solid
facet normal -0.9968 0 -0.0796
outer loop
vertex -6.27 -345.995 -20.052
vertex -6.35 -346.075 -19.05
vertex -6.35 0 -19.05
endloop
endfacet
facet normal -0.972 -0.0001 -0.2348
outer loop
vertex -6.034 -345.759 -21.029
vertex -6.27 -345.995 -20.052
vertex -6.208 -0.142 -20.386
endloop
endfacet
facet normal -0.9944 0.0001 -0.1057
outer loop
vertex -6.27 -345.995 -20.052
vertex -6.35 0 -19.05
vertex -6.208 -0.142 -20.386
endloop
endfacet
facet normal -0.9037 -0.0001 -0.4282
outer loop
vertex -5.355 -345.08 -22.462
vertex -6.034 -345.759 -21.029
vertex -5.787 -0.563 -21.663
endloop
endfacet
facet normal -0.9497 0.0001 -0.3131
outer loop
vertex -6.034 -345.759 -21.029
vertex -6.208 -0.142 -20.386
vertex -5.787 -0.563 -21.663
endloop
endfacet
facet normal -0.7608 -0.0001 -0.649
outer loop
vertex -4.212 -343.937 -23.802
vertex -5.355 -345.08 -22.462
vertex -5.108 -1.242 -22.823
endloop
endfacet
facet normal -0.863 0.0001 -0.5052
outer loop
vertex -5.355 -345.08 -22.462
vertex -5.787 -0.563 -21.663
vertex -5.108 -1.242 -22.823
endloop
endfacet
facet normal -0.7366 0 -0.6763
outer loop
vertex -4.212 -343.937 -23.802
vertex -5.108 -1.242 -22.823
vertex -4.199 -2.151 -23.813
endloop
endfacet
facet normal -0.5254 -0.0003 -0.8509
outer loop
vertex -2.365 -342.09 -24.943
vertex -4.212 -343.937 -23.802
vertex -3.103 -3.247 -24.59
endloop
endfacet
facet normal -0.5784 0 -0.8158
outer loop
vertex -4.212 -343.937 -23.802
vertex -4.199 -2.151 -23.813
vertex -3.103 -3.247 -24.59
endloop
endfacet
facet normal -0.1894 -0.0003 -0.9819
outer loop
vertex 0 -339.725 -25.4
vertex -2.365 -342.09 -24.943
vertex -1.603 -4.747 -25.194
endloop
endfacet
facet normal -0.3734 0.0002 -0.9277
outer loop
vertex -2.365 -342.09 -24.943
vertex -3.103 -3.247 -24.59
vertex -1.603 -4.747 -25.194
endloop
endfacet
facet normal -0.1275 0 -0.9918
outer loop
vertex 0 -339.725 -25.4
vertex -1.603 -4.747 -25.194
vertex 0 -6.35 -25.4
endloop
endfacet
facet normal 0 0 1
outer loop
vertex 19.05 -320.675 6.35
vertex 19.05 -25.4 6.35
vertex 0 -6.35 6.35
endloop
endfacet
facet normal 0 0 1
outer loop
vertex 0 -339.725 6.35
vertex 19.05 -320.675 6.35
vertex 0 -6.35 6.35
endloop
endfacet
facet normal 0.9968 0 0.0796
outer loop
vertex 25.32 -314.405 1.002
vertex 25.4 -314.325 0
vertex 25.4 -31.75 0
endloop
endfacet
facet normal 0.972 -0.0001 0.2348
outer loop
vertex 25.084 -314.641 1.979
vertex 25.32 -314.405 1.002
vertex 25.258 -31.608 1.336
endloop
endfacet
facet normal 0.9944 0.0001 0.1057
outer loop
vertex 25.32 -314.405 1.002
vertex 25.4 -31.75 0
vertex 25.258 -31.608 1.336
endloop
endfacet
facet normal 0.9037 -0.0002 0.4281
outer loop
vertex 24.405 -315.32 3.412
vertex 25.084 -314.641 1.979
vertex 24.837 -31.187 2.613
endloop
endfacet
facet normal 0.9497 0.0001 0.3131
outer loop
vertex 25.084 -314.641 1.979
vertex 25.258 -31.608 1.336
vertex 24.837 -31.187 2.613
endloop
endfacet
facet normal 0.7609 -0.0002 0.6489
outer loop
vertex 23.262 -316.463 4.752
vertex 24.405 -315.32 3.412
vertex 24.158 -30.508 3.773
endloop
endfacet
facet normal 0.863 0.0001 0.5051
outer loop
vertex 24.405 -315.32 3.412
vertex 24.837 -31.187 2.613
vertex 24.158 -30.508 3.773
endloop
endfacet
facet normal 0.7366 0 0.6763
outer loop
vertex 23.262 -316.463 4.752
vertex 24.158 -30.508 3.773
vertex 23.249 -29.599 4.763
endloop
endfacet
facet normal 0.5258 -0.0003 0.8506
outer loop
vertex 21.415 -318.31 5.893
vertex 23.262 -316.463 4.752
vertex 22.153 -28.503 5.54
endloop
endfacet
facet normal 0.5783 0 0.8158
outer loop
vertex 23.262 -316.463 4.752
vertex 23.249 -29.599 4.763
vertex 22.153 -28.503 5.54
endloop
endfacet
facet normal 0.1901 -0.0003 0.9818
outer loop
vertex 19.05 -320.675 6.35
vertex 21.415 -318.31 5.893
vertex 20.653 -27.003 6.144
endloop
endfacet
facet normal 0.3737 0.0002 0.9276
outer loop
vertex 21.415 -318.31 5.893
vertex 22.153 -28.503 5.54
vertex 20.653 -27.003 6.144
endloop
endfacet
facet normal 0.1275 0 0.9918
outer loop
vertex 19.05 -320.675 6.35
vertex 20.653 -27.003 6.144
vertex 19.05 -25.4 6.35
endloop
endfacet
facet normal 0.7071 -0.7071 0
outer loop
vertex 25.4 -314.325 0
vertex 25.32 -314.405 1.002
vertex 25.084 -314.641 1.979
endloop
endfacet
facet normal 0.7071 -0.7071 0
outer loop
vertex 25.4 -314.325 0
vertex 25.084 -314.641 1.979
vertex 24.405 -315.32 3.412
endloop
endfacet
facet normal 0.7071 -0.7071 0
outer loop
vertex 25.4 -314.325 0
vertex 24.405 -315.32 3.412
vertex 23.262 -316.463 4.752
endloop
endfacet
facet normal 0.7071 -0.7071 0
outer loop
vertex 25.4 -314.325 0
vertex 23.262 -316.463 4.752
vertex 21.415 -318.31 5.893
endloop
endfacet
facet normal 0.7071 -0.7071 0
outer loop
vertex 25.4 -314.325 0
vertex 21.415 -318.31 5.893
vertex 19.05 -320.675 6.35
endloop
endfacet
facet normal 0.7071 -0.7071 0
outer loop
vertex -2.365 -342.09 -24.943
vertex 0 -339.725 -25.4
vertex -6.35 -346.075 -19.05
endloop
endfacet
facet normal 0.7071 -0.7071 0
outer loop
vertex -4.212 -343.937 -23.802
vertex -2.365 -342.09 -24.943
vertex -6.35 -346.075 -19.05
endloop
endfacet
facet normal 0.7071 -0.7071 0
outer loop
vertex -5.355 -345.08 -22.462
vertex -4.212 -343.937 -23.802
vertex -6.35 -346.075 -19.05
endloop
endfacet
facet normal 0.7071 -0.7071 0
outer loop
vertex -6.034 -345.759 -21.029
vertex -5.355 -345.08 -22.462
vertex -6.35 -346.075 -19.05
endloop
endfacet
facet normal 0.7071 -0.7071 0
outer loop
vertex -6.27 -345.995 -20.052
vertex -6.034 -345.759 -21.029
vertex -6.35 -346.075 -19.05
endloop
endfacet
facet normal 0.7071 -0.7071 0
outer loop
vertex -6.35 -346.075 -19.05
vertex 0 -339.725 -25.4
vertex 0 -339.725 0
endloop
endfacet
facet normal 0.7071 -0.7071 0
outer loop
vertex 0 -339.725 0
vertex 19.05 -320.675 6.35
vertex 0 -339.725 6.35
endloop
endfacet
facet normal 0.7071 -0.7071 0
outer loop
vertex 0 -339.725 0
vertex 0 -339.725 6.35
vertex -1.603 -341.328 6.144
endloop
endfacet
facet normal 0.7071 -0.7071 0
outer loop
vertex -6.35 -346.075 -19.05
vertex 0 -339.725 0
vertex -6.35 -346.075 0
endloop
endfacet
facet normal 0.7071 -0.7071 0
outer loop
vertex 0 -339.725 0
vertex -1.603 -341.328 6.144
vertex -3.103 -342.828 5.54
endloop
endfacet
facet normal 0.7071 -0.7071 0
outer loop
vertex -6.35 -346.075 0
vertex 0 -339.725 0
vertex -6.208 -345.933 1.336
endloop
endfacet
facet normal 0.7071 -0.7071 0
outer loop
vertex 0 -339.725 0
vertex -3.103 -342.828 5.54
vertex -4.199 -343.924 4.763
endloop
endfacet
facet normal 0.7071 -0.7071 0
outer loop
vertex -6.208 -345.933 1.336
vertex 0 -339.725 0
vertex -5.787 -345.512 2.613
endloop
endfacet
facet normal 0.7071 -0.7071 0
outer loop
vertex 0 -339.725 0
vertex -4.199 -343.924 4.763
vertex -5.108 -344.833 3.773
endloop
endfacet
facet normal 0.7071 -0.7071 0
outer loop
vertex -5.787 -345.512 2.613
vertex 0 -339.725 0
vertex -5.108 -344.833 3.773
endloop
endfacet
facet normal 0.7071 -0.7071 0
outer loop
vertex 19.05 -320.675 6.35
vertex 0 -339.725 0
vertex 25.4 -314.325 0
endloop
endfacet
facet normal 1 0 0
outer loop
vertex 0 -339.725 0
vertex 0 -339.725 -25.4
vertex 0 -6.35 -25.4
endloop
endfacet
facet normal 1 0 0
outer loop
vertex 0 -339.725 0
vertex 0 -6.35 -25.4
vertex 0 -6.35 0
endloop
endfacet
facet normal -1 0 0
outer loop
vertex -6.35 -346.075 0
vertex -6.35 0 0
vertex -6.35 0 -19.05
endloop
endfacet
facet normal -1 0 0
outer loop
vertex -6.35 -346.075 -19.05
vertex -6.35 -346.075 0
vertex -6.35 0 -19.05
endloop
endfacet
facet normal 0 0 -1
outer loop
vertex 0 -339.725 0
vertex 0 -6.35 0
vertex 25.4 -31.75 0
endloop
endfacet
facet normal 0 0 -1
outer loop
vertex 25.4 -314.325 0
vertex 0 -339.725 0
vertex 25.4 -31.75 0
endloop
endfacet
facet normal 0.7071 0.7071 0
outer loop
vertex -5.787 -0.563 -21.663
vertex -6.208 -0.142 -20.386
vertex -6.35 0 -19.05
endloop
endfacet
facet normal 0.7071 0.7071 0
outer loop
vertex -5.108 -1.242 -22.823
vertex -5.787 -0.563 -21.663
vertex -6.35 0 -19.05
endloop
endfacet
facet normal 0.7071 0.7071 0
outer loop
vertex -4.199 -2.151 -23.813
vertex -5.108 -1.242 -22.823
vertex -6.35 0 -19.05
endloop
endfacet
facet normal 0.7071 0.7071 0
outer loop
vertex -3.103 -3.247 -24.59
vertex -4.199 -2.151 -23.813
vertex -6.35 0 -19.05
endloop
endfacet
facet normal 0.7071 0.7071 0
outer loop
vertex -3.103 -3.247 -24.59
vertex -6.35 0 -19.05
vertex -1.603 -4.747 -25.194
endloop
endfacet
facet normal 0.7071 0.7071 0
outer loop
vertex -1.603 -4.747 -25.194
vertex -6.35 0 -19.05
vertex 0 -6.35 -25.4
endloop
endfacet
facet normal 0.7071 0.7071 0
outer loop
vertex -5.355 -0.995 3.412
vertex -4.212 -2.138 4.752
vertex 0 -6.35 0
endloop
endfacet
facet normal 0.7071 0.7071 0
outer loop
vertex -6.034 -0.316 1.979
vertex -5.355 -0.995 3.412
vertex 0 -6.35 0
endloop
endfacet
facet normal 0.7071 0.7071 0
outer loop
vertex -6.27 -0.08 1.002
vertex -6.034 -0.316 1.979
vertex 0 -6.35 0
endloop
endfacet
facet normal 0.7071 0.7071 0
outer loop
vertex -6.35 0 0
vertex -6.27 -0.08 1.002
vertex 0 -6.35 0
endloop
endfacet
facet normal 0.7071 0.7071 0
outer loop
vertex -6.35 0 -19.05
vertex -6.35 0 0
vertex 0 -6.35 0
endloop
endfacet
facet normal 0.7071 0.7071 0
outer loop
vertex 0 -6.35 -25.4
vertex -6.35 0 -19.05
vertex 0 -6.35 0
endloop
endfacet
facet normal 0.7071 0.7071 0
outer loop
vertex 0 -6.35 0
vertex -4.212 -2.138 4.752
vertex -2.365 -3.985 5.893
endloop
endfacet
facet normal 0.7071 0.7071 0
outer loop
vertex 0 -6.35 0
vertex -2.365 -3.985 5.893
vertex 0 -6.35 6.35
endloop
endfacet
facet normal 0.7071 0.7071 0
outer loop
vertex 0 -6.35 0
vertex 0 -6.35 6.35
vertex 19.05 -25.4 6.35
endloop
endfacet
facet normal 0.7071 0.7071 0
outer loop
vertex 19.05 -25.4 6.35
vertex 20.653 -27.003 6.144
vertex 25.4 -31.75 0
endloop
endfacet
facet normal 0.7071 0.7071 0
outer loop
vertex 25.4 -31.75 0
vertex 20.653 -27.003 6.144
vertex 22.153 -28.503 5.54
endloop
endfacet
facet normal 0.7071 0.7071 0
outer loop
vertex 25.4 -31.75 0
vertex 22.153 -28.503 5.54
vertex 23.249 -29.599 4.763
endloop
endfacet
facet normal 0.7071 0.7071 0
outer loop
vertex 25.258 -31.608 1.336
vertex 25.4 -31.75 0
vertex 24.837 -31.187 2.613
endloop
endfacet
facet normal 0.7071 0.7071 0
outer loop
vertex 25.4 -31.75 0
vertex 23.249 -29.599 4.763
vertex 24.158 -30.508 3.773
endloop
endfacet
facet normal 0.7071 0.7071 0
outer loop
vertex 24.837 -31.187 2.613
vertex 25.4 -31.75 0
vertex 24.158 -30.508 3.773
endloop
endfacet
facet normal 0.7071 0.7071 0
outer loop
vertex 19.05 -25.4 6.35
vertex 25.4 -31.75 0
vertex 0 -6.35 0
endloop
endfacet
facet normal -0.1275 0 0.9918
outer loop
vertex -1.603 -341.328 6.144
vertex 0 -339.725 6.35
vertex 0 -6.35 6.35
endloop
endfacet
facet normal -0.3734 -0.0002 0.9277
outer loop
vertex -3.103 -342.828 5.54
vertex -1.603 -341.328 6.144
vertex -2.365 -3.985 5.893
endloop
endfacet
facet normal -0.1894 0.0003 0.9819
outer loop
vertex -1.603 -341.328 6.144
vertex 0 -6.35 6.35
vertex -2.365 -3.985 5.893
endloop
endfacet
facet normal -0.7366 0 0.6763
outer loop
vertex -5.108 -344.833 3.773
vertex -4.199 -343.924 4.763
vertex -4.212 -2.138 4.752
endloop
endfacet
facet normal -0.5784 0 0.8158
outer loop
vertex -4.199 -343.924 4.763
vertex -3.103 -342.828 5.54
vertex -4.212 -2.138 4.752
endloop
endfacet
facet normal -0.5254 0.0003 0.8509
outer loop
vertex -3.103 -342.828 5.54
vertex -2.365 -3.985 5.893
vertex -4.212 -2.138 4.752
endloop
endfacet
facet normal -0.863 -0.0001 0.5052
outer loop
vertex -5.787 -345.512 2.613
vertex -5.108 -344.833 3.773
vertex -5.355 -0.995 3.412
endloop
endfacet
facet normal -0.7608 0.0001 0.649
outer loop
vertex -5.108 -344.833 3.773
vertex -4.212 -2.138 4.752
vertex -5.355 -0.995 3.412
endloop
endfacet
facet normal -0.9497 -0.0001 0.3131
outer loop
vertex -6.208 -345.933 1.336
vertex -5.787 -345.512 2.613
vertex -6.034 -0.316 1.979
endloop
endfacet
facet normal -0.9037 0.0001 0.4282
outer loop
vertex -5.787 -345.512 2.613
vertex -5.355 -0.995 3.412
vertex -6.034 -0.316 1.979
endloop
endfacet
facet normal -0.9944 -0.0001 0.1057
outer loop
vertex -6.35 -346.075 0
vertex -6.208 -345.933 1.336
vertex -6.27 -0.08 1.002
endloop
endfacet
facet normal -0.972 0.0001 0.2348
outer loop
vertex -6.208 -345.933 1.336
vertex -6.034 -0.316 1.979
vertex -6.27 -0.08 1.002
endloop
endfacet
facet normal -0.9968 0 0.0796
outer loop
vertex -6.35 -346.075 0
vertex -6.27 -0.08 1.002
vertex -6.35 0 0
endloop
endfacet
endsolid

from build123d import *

# Parameters (mm, degrees)
F1_DEPTH = 346.075
F3_DEPTH = 31.751
F5_DEPTH = 38.1


with BuildPart() as f1:
    # F0 (on Front) → F1 (new body)
    with BuildSketch(Plane.XZ):
        with BuildLine():
            Line((0, -25.4), (0, 0))
            Line((0, 0), (25.4, 0))
            ThreePointArc((25.4, 0), (23.5401280605, 4.4901280605), (19.05, 6.35))
            Line((19.05, 6.35), (0, 6.35))
            ThreePointArc((0, 6.35), (-4.4901280605, 4.4901280605), (-6.35, 0))
            Line((-6.35, 0), (-6.35, -19.05))
            ThreePointArc((-6.35, -19.05), (-4.4901280605, -23.5401280605), (0, -25.4))
        make_face()
    extrude(amount=F1_DEPTH)

    # F2 (on face) → F3 (cut, through all)
    with BuildSketch(Plane.XY.offset(6.35)):
        Polygon((31.0680039475, -308.6569960525), (19.05, -320.675), (19.05, -346.075), (25.9507503361, -346.075), align=None)
        Polygon((19.05, -320.675), (0, -339.725), (0, -346.075), (19.05, -346.075), align=None)
        Polygon((0, -339.725), (-6.35, -346.075), (0, -346.075), align=None)
    extrude(amount=-F3_DEPTH, mode=Mode.SUBTRACT)

    # F4 (on face) → F5 (cut)
    with BuildSketch(Plane.XY.offset(6.35)):
        Polygon((25.4, 0), (-6.35, 0), (25.4, -31.75), align=None)
    extrude(amount=-F5_DEPTH, mode=Mode.SUBTRACT)


solid = f1.part
